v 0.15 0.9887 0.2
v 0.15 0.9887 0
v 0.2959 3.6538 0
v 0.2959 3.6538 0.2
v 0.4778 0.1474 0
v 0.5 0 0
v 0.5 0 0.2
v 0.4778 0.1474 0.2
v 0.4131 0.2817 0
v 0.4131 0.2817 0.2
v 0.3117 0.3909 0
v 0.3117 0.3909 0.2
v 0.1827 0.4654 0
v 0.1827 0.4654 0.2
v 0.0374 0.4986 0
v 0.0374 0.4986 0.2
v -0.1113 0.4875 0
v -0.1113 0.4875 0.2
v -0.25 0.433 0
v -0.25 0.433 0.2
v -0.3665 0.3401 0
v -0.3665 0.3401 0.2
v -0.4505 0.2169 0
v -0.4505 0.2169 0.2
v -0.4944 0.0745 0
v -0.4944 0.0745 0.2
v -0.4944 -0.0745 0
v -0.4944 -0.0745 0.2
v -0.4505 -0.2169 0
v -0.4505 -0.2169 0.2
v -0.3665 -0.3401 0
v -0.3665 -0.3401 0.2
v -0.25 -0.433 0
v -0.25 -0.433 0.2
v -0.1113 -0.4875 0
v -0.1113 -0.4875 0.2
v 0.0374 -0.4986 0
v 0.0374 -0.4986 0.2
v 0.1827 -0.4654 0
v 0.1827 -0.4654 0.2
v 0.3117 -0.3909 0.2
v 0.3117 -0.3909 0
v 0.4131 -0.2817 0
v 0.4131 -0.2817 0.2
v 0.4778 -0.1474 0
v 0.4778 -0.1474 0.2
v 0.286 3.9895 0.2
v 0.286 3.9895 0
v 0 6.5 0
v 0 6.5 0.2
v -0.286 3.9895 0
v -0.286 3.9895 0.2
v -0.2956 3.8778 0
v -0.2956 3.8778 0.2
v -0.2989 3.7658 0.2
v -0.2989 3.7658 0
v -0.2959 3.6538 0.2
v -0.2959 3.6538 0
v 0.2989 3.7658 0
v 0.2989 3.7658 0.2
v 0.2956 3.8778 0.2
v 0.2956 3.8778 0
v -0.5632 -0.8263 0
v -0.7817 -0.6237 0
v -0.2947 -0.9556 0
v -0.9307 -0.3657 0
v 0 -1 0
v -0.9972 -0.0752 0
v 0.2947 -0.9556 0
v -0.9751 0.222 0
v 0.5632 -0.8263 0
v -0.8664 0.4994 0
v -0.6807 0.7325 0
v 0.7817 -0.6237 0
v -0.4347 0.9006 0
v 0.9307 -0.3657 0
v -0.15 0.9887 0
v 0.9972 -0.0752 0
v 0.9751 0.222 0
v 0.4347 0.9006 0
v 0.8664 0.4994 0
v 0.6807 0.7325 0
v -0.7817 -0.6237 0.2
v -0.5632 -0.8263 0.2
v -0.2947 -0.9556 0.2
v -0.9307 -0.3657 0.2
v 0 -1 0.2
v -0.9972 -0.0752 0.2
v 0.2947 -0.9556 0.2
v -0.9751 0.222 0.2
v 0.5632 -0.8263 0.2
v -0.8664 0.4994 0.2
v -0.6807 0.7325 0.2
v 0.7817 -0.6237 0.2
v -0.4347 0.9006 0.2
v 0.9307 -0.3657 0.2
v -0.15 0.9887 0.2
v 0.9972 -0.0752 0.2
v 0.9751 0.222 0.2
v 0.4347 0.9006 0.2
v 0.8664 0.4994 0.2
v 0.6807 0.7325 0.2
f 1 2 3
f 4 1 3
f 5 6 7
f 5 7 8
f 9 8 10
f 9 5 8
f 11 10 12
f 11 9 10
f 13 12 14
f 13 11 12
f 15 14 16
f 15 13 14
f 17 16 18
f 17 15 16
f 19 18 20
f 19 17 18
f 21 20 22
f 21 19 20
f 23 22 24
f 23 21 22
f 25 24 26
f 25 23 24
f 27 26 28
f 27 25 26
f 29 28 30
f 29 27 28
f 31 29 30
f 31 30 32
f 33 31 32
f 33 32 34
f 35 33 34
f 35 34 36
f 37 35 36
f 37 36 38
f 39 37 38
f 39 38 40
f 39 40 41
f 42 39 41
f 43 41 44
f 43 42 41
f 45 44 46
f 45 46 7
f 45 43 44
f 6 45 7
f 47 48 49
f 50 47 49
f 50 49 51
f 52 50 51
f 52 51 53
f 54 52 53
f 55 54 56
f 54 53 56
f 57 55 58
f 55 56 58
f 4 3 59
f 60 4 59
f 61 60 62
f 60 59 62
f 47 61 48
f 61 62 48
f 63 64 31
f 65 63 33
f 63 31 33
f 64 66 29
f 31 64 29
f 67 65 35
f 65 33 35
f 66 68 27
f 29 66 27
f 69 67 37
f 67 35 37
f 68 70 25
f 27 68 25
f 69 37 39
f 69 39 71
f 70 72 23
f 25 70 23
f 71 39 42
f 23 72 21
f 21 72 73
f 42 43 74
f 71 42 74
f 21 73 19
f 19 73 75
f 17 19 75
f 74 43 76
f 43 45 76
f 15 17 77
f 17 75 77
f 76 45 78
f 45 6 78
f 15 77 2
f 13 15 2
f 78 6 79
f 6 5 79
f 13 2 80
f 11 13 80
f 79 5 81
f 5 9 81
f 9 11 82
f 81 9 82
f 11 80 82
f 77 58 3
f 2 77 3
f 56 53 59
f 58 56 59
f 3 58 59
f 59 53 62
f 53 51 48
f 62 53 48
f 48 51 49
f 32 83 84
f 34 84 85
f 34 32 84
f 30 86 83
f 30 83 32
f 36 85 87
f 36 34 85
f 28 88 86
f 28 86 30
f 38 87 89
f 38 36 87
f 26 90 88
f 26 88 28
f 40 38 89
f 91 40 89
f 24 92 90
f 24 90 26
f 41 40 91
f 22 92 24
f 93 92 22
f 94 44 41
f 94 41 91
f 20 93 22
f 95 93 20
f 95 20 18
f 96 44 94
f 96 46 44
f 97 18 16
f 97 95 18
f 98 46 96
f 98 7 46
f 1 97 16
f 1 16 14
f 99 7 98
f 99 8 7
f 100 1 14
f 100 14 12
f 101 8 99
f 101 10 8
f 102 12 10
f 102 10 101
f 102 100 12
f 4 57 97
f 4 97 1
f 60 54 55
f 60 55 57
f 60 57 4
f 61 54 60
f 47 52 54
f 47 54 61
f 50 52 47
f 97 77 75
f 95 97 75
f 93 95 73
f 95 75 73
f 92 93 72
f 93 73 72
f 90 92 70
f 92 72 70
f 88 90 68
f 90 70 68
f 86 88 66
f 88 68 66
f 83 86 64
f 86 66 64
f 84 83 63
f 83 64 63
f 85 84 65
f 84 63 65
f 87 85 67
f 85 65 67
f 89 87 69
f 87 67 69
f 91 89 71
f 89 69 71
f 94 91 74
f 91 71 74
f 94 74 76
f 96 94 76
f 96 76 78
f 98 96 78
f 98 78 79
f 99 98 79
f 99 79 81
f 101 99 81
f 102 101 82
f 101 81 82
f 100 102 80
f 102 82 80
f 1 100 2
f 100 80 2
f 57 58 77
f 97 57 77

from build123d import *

# Parameters (mm, degrees)
SKETCH1_R           = 0.5
BOSS_EXTRUDE1_DEPTH = 0.2


with BuildPart() as part:
    # Sketch1 → Boss-Extrude1 (new body)
    with BuildSketch(Plane.XY):
        with BuildLine():
            Line((0, 6.5), (-0.28601036, 3.989482622))
            ThreePointArc((-0.28601036, 3.989482622), (-0.298001268, 3.821843977), (-0.295875021, 3.653790485))
            Line((-0.295875021, 3.653790485), (-0.15, 0.988685997))
            ThreePointArc((-0.15, 0.988685997), (0, -1), (0.15, 0.988685997))
            Line((0.15, 0.988685997), (0.295875021, 3.653790485))
            ThreePointArc((0.295875021, 3.653790485), (0.298001268, 3.821843977), (0.28601036, 3.989482622))
            Line((0.28601036, 3.989482622), (0, 6.5))
        make_face()
        Circle(SKETCH1_R, mode=Mode.SUBTRACT)
    extrude(amount=BOSS_EXTRUDE1_DEPTH)


solid = part.part
